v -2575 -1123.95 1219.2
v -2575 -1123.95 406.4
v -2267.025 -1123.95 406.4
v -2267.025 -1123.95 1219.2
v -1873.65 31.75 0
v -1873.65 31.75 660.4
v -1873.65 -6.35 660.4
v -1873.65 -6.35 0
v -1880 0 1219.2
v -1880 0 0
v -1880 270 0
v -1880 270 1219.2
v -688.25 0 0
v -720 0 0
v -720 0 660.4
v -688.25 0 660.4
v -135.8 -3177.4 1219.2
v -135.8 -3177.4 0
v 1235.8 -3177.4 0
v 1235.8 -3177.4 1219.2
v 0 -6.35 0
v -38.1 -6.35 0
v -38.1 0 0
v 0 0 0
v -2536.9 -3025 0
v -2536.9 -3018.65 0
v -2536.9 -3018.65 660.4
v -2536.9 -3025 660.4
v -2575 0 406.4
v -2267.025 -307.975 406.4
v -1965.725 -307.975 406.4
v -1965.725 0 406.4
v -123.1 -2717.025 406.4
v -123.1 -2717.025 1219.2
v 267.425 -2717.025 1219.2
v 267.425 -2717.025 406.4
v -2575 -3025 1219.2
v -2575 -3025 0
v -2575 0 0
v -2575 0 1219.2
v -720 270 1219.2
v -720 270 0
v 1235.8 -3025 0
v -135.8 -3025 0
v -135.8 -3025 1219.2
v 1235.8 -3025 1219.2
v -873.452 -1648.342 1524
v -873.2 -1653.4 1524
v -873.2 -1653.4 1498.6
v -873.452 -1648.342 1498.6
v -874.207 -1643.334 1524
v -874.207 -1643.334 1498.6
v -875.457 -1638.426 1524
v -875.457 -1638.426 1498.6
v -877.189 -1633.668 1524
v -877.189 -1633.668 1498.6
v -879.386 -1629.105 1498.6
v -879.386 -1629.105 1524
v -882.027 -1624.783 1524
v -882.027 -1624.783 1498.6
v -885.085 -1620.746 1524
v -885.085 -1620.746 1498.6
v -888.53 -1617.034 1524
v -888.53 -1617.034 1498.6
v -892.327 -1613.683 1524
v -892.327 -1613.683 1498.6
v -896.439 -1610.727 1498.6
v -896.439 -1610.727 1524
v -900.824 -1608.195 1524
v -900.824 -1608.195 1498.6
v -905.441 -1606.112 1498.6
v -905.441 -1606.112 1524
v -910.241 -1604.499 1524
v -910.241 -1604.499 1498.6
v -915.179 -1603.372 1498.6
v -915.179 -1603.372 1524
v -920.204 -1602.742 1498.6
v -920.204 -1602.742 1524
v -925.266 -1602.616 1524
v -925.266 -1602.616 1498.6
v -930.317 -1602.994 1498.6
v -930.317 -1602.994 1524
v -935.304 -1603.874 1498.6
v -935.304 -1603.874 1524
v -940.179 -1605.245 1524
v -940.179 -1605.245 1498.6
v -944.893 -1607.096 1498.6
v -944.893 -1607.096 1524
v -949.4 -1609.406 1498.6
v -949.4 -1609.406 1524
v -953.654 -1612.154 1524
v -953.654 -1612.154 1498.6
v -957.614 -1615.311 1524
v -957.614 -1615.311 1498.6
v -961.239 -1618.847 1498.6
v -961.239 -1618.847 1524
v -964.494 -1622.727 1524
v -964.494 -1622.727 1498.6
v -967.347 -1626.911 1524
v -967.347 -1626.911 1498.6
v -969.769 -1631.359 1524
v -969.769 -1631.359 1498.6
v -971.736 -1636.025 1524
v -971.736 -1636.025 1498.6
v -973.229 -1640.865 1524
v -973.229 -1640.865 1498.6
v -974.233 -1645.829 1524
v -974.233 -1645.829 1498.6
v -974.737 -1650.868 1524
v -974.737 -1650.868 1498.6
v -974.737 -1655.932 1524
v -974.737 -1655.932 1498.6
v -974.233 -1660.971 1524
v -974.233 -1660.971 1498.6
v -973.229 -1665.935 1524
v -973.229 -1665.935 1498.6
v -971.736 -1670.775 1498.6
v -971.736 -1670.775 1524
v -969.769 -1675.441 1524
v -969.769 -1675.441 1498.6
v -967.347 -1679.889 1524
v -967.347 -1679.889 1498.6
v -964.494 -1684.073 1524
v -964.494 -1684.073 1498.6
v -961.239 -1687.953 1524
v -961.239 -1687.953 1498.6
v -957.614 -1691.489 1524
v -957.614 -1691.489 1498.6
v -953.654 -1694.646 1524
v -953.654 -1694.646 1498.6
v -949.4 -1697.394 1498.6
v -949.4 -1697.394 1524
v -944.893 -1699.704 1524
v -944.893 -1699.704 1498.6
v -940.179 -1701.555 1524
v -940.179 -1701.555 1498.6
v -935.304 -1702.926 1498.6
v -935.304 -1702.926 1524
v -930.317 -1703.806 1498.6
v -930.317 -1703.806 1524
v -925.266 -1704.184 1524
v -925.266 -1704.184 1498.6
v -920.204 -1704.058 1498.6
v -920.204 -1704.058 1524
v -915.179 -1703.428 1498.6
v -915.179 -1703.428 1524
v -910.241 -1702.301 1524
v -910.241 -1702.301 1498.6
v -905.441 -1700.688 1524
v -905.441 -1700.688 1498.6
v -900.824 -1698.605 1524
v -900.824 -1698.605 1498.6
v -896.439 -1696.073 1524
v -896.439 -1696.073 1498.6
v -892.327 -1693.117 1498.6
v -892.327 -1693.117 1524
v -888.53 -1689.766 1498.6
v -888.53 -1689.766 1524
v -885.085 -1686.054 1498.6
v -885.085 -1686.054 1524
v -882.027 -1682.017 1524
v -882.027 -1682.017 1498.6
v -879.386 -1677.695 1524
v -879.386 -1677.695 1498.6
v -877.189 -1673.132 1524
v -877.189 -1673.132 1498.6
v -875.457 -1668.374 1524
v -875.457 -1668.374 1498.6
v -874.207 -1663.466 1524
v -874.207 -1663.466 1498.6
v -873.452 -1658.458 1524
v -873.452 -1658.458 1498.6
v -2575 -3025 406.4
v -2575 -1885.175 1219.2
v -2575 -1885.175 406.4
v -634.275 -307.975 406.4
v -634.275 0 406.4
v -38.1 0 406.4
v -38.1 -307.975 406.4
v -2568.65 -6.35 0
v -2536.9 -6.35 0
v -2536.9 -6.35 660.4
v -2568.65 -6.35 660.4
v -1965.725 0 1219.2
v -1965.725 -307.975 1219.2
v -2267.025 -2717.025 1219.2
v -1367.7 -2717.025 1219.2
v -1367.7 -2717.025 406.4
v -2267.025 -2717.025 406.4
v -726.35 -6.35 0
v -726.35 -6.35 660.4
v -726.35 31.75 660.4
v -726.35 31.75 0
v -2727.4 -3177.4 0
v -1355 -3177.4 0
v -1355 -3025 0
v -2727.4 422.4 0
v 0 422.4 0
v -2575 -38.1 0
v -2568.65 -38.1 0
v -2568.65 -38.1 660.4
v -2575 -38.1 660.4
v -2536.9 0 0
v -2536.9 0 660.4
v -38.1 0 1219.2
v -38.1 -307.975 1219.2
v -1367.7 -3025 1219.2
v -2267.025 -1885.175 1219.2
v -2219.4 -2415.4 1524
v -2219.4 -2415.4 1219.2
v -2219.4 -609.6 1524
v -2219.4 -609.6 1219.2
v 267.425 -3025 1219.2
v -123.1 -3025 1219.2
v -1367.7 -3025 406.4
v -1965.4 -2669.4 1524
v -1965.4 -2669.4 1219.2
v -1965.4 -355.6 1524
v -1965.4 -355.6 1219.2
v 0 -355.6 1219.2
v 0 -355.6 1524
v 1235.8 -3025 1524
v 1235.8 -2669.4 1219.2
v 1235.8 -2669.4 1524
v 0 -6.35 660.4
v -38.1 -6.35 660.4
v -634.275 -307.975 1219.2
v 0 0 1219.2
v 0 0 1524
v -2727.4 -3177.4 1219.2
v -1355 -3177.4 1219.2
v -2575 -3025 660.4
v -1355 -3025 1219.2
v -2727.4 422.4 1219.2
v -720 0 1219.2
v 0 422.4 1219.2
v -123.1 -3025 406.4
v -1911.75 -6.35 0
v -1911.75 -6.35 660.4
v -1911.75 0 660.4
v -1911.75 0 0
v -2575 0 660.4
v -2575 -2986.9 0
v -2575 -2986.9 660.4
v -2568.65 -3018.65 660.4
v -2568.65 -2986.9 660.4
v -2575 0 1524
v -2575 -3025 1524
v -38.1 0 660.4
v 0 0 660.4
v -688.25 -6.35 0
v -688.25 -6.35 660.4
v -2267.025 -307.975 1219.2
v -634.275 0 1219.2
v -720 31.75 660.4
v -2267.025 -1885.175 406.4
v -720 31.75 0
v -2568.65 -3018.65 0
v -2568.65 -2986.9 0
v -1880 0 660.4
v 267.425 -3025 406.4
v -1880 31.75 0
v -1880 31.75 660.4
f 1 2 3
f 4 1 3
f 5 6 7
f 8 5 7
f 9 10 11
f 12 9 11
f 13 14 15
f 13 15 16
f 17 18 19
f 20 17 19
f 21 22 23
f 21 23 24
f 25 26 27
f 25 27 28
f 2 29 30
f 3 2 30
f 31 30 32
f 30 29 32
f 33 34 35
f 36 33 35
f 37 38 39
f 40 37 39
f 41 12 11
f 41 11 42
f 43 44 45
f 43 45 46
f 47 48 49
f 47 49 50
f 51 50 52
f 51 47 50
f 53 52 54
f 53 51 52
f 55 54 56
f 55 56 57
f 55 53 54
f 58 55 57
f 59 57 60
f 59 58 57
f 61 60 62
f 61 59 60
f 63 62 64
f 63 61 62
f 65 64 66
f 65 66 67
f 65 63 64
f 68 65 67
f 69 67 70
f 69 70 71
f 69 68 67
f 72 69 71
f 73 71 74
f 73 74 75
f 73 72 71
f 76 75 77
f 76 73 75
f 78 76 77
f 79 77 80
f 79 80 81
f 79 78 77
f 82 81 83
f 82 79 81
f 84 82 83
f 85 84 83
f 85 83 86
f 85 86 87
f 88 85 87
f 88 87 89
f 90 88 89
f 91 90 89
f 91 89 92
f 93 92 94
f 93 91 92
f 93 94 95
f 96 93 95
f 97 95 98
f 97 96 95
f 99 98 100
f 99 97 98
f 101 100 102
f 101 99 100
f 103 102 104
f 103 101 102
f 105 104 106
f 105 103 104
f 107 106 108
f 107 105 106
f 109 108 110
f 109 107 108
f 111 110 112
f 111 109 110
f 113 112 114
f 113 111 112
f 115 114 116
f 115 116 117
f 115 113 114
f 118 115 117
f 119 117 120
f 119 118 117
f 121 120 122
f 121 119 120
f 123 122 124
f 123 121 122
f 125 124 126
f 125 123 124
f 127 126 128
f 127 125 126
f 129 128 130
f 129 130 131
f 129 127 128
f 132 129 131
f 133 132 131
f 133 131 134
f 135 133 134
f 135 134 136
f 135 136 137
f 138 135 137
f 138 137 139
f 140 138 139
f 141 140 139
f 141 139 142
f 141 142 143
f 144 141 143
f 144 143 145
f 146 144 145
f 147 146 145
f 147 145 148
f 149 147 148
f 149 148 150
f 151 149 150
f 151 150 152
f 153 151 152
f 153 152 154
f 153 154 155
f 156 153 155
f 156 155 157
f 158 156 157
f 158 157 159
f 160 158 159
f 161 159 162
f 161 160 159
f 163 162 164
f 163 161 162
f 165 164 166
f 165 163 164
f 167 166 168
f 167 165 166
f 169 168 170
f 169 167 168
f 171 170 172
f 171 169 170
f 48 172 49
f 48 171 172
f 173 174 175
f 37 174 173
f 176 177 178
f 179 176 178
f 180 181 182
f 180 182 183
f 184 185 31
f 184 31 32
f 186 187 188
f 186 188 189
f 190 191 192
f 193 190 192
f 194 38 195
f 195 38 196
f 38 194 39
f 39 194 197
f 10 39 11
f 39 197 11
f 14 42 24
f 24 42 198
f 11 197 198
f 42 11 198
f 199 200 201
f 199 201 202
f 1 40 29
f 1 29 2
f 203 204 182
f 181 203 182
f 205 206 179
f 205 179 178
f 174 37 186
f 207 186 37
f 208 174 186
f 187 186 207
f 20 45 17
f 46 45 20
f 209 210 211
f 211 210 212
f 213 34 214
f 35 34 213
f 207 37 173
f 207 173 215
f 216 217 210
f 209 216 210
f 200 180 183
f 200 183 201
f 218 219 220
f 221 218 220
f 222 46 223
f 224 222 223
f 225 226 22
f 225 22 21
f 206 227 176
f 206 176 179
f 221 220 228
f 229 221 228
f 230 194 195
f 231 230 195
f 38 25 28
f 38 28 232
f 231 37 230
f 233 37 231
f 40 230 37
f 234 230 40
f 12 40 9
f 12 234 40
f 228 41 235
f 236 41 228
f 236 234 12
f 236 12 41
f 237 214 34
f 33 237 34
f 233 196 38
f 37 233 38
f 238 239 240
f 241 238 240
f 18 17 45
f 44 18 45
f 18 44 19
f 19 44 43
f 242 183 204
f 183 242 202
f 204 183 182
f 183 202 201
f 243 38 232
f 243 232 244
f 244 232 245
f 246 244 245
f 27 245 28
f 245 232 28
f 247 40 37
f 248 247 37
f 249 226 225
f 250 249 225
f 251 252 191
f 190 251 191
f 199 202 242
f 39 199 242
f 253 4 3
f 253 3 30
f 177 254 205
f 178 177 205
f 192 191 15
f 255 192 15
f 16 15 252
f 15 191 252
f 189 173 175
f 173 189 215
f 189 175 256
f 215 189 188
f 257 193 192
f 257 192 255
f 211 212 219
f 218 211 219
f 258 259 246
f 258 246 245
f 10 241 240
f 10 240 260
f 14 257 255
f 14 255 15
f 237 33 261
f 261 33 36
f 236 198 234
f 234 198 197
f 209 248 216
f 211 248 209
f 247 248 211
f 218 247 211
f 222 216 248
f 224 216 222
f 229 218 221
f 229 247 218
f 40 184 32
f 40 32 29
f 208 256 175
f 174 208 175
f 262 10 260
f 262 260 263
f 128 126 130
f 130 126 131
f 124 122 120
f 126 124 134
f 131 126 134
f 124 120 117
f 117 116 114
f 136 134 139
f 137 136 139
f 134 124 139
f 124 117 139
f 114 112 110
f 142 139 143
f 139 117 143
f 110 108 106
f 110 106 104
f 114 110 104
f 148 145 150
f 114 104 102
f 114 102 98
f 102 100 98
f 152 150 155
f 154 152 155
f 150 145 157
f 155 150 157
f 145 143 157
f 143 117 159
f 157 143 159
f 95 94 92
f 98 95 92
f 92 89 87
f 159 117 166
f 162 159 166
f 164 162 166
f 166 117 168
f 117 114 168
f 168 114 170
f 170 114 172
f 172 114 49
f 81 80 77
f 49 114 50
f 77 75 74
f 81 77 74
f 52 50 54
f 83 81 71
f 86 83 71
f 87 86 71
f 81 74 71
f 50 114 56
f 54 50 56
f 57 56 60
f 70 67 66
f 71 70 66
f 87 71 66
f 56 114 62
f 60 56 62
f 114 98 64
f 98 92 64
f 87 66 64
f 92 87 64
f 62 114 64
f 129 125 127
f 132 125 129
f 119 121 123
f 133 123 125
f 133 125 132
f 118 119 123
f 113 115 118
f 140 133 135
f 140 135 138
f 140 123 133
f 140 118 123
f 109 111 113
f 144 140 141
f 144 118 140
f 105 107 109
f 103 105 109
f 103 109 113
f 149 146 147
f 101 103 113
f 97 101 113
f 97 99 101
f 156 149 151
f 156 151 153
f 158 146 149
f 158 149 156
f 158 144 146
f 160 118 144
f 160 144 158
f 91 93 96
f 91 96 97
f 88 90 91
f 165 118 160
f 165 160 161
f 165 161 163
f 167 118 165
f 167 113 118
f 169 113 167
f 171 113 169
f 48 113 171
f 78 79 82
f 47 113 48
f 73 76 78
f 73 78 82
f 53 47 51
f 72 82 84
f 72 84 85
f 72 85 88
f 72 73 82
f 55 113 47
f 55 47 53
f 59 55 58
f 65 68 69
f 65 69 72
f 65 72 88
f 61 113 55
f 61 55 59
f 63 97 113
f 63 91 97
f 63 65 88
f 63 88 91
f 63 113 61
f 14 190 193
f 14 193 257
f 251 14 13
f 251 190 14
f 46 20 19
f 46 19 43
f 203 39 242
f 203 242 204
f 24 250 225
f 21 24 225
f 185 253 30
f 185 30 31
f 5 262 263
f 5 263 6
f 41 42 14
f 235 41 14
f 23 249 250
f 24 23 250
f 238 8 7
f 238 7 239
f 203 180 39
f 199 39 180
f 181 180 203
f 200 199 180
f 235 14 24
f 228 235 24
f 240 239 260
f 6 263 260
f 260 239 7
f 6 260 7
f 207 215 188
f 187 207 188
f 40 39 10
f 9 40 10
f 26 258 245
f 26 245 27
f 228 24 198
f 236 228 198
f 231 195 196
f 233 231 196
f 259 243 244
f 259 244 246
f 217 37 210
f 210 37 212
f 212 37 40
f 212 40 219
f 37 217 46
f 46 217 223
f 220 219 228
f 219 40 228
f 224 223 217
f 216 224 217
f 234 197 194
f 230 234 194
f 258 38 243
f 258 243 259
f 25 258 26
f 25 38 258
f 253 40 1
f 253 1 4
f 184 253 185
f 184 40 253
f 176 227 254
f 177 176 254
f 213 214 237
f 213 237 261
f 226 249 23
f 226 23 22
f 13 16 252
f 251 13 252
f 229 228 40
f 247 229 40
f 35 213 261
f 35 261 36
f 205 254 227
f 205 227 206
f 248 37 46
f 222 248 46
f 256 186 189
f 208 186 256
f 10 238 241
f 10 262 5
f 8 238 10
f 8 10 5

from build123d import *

# Parameters (mm, degrees)
F0_W     = 1371.6
F0_H     = 152.4
F1_DEPTH = 1219.2
F2_W     = 596.175
F2_H     = 307.975
F2_W_2   = 390.525
F3_DEPTH = 812.8
F4_W     = 38.1
F4_H     = 6.35
F5_DEPTH = 660.4
F7_DEPTH = 304.8
F8_R     = 50.8
F9_DEPTH = 25.4


with BuildPart() as f1:
    # F0 (on Top) → F1 (new body)
    with BuildSketch(Plane.XY):
        Polygon((-720, 0), (0, 0), (0, 422.4), (-2727.4, 422.4), (-2727.4, -3177.4), (-1355, -3177.4), (-1355, -3025), (-2575, -3025), (-2575, 0), (-1880, 0), (-1880, 270), (-720, 270), align=None)
        with Locations((550, -3101.2)):
            Rectangle(F0_W, F0_H)
    extrude(amount=F1_DEPTH)


with BuildPart() as f3:
    # F2 (on face) → F3 (new body)
    with BuildSketch(Plane.XY.offset(1219.2)):
        with Locations((-336.1875, -153.9875)):
            Rectangle(F2_W, F2_H)
        Polygon((-1965.725, -307.975), (-1965.725, 0), (-2575, 0), (-2575, -1123.95), (-2267.025, -1123.95), (-2267.025, -307.975), align=None)
        Polygon((-2267.025, -1885.175), (-2575, -1885.175), (-2575, -3025), (-1367.7, -3025), (-1367.7, -2717.025), (-2267.025, -2717.025), align=None)
        with Locations((72.1625, -2871.0125)):
            Rectangle(F2_W_2, F2_H)
    extrude(amount=-F3_DEPTH)


with BuildPart() as f5:
    # F4 (on face) → F5 (new body)
    with BuildSketch(Plane(origin=(0, 0, 0), x_dir=(1, 0, 0), z_dir=(0, 0, -1))):
        with Locations((-19.05, 3.175)):
            Rectangle(F4_W, F4_H)
        Polygon((-720, 0), (-688.25, 0), (-688.25, 6.35), (-726.35, 6.35), (-726.35, -31.75), (-720, -31.75), align=None)
        Polygon((-1911.75, 6.35), (-1911.75, 0), (-1880, 0), (-1880, -31.75), (-1873.65, -31.75), (-1873.65, 6.35), align=None)
        Polygon((-2575, 38.1), (-2575, 0), (-2536.9, 0), (-2536.9, 6.35), (-2568.65, 6.35), (-2568.65, 38.1), align=None)
        Polygon((-2536.9, 3025), (-2575, 3025), (-2575, 2986.9), (-2568.65, 2986.9), (-2568.65, 3018.65), (-2536.9, 3018.65), align=None)
    extrude(amount=-F5_DEPTH)


with BuildPart() as f7:
    # F6 (on face) → F7 (new body)
    with BuildSketch(Plane.XY.offset(1219.2)):
        Polygon((-2575, 0), (-2575, -3025), (1235.8, -3025), (1235.8, -2669.4), (-1965.4, -2669.4), (-2219.4, -2415.4), (-2219.4, -609.6), (-1965.4, -355.6), (0, -355.6), (0, 0), align=None)
    extrude(amount=F7_DEPTH)


with BuildPart() as f9:
    # F8 (on face) → F9 (new body)
    with BuildSketch(Plane.XY.offset(1524)):
        with Locations((-924, -1653.4)):
            Circle(F8_R)
    extrude(amount=-F9_DEPTH)


solid = Compound([f1.part, f3.part, f5.part, f7.part, f9.part])
